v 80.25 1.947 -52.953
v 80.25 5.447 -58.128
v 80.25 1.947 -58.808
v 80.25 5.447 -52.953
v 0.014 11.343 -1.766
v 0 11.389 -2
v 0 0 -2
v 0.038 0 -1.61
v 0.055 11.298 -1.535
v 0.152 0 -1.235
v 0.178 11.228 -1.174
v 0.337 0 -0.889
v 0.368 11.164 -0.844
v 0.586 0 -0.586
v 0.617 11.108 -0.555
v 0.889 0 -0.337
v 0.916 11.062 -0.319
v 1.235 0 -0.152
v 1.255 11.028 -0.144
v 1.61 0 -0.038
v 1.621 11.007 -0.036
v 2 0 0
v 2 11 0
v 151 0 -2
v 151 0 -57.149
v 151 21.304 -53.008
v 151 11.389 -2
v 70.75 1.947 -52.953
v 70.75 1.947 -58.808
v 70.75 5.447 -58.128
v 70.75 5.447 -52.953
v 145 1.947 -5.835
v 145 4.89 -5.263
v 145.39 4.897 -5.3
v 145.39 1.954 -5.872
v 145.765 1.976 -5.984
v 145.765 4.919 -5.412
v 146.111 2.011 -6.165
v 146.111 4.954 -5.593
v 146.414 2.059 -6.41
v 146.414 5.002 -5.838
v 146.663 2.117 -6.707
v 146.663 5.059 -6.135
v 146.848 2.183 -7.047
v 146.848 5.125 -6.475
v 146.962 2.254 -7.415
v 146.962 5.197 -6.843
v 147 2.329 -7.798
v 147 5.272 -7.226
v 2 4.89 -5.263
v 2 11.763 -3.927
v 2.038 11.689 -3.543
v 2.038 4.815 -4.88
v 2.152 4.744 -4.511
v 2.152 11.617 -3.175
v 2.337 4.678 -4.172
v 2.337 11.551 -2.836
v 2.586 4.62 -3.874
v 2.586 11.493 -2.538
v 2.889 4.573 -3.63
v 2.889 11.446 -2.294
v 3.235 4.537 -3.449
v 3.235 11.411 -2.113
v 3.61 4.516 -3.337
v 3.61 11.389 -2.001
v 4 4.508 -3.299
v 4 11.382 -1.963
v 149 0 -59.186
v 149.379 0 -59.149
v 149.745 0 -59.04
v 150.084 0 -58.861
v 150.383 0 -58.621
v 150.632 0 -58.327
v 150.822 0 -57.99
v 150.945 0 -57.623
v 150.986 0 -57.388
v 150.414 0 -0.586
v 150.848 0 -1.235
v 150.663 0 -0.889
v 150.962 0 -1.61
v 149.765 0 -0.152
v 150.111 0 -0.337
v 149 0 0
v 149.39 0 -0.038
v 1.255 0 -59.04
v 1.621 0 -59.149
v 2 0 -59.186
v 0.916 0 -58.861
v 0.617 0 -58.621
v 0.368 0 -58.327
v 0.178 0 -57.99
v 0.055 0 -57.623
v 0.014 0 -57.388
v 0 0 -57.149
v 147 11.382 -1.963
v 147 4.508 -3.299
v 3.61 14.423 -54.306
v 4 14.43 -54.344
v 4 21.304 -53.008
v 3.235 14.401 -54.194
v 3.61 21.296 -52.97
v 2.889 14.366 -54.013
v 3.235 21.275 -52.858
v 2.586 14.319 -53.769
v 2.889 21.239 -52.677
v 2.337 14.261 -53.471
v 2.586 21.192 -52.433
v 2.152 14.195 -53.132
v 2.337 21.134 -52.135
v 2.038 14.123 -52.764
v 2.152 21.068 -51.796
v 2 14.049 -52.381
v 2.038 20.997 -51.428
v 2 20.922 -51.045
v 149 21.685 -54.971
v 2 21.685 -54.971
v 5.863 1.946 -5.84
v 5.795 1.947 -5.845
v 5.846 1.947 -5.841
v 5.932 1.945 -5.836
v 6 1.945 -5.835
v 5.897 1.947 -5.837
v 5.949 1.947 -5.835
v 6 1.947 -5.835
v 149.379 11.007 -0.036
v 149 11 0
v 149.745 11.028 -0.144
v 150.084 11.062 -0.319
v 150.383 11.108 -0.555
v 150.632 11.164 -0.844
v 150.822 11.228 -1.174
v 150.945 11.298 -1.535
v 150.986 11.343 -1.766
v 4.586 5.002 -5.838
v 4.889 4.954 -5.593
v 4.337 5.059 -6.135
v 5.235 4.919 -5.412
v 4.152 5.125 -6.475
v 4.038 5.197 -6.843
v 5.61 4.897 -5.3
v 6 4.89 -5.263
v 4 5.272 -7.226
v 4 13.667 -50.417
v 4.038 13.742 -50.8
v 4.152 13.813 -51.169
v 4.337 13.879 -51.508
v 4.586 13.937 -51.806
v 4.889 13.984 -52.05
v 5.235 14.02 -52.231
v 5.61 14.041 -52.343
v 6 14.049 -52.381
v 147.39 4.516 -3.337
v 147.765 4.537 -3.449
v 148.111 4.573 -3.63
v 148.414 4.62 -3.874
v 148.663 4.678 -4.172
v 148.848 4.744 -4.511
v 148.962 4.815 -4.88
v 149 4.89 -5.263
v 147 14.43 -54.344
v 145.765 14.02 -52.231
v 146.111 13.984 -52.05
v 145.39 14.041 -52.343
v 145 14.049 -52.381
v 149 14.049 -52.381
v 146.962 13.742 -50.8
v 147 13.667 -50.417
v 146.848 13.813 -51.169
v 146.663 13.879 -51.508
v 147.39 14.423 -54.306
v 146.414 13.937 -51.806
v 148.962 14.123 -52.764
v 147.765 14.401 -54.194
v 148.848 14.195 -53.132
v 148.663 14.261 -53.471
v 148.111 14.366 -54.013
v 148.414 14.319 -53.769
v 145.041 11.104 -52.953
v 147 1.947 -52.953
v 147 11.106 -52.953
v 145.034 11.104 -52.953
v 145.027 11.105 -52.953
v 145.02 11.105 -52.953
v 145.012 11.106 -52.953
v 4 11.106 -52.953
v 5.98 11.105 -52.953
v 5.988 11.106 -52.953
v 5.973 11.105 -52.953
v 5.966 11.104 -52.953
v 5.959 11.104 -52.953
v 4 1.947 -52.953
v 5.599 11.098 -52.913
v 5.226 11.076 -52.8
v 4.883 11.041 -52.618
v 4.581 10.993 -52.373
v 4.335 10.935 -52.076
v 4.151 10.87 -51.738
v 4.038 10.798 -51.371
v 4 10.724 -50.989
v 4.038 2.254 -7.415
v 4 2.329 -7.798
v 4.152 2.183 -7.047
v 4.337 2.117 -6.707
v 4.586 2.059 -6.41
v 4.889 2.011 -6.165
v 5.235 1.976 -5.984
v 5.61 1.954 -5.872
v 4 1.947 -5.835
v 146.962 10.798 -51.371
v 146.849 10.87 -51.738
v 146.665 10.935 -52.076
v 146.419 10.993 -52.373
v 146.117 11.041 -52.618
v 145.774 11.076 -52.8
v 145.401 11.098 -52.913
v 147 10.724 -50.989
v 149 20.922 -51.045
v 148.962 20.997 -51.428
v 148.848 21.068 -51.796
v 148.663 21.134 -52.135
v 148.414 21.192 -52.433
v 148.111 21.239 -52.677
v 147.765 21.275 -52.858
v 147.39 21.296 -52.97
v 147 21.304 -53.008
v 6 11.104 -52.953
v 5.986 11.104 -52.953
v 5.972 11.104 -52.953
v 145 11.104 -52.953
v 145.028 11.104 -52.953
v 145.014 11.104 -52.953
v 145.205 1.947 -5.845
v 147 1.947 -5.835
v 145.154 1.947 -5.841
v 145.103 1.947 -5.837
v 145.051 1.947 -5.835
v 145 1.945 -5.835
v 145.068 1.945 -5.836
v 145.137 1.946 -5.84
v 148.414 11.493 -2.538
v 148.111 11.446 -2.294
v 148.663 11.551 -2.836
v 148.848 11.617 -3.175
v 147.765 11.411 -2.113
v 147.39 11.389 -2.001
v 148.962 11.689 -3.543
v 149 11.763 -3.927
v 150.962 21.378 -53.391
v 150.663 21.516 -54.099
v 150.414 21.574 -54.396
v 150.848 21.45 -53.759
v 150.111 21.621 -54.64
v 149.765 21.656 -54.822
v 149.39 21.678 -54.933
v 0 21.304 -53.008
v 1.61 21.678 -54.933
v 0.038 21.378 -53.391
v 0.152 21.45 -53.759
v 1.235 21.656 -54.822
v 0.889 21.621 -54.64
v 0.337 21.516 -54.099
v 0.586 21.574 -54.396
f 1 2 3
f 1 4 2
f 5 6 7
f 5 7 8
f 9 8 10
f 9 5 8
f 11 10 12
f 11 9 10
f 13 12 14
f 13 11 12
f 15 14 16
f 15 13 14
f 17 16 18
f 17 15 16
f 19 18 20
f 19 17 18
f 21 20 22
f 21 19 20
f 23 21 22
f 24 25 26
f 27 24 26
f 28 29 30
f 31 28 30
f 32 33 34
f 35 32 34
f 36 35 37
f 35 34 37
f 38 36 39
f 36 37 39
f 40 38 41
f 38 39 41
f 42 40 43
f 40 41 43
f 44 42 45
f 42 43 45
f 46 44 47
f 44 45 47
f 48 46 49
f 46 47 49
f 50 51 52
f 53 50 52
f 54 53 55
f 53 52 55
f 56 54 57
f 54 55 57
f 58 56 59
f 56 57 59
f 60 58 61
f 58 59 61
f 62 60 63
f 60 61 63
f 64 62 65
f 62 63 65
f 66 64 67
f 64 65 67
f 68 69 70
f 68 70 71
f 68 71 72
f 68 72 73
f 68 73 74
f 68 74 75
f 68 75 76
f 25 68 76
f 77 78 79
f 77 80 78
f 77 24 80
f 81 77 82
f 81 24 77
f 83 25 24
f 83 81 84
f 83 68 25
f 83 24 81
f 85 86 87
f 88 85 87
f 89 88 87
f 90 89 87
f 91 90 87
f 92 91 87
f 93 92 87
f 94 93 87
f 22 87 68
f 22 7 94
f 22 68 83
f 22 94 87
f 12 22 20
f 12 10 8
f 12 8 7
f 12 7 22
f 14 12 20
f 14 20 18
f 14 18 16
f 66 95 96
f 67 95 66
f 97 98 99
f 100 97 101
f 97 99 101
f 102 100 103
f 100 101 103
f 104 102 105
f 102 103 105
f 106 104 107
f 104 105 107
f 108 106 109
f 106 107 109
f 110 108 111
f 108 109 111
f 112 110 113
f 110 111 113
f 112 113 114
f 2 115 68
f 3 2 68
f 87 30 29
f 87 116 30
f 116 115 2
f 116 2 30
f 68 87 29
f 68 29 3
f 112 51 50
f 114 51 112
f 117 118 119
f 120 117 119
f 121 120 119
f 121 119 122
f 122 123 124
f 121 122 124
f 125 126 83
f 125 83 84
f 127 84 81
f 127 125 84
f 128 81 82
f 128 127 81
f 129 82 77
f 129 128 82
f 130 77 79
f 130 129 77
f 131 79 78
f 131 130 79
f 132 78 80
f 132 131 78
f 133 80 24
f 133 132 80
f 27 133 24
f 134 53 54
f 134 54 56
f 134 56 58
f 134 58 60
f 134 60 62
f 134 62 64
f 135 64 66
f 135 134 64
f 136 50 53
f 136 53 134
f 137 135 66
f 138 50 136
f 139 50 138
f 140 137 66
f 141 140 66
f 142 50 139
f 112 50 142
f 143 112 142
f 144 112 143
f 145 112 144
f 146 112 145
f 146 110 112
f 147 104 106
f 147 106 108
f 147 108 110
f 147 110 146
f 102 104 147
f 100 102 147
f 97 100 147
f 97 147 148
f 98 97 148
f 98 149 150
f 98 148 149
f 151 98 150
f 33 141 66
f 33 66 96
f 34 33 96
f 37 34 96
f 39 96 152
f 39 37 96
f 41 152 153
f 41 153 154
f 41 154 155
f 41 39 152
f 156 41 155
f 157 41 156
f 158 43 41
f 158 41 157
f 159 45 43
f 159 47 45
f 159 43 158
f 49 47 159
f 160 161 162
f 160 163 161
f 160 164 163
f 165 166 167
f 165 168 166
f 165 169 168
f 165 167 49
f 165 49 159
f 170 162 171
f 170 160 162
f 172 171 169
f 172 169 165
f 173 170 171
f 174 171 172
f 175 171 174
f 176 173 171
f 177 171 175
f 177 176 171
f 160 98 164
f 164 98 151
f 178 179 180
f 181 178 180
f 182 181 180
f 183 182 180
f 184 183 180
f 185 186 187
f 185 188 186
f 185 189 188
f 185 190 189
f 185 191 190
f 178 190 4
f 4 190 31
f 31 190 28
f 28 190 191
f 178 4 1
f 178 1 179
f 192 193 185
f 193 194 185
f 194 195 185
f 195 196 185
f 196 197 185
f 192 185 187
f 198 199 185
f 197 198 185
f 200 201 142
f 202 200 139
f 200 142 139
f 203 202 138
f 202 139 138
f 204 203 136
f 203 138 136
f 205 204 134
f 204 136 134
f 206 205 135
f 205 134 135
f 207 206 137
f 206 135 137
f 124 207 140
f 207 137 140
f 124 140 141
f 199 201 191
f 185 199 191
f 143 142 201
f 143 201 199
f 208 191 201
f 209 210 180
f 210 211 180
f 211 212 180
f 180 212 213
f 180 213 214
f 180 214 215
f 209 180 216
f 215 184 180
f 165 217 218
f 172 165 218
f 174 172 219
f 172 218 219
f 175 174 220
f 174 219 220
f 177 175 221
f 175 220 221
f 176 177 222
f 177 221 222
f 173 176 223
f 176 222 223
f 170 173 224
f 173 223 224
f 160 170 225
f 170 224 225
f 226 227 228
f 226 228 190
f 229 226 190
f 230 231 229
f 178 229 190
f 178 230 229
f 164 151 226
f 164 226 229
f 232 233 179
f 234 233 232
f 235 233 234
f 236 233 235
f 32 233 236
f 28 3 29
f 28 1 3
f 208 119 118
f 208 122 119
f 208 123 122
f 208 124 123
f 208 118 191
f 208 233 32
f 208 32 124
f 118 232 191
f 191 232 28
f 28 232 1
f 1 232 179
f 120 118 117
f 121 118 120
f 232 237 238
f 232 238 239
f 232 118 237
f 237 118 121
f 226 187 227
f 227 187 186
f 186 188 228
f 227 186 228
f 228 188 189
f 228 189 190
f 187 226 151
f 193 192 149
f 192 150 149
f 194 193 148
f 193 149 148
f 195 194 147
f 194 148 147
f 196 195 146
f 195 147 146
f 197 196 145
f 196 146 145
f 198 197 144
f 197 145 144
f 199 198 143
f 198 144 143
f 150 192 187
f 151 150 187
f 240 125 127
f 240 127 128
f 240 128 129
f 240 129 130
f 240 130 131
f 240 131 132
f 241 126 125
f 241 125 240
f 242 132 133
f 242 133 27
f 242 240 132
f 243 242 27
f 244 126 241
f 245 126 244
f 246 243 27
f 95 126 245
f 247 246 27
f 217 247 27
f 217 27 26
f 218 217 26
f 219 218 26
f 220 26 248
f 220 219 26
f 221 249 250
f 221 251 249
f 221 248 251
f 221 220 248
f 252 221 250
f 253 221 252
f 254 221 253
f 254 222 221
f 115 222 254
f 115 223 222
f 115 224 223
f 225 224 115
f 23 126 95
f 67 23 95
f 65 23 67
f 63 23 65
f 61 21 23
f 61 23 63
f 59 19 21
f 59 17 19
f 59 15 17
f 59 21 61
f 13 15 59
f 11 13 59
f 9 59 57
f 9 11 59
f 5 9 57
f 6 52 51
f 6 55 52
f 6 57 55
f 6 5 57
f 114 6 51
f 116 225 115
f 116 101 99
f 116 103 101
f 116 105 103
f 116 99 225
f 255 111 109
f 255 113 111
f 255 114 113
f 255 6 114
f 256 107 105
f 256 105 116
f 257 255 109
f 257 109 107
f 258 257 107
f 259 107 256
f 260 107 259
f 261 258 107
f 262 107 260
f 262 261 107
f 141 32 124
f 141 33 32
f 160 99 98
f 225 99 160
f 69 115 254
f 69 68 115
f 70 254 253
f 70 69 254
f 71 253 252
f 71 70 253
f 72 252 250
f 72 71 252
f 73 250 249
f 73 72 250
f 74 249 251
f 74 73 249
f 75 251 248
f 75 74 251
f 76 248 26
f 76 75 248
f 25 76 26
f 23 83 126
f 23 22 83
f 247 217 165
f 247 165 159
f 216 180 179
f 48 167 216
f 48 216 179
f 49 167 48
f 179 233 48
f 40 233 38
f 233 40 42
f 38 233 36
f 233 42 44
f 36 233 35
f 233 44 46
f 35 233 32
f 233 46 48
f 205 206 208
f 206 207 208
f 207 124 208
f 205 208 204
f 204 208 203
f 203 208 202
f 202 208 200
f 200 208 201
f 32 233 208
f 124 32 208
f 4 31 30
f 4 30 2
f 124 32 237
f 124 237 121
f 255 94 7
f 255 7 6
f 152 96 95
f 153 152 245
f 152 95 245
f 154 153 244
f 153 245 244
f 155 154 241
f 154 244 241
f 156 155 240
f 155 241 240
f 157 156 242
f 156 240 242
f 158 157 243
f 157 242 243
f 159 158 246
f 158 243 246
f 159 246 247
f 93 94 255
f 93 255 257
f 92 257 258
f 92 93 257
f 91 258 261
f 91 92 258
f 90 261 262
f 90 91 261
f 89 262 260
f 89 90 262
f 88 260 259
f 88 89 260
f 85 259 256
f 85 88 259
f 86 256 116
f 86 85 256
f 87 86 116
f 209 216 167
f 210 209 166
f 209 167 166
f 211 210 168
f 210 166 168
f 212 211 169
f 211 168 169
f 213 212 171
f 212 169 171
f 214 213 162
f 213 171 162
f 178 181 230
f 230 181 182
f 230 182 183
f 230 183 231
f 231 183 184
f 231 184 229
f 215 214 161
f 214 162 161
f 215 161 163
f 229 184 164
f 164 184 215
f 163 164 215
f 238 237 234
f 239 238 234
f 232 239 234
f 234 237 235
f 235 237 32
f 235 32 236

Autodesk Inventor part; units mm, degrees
ref_plane "YZ Plane" through (0, 0, 0) normal (1, 0, 0) x (0, 1, 0)
ref_plane "XZ Plane" through (0, 0, 0) normal (0, 1, 0) x (-1, 0, 0)
sketch "Sketch1" plane through (0, 0, 0) normal (1, 0, 0) x (0, 1, 0)
  line L0 (0, 0) -> (11, 0)
  line L1 (11, 0) -> (21.6853, -54.9711)
  line L2 (11, 0) -> (67, 0) construction
  line L3 (21.6853, -54.9711) -> (0, -59.1863)
  line L4 (21.6853, -54.9711) -> (43.7765, -54.9711) construction
  line L5 (0, -59.1863) -> (0, 0)
  dimension "d0" = 11
  dimension "d1" = 56
  dimension "d2" = 79
  dimension "d5" = 169
extrude "Extrusion1" add sketch "Sketch1" along normal blind 151
fillet "Fillet1" radius 2 4 edges at (151, 10.8427, -57.0787) (151, 5.5, 0) (0, 10.8427, -57.0787) (0, 5.5, 0)
sketch "Sketch2" plane through (2, 11, 0) normal (0, 0.9816, 0.1908) x (1, 0, 0)
  ellipse E0 centre (0, 2.0374) end of major axis (0, 0) minor radius 2 (-2, 2.0374) -> (0, 0) ccw projected
  line L0 (0, 0) -> (147, 0) projected
  ellipse E1 centre (147, 2.0374) end of major axis (147, 0) minor radius 2 (147, 0) -> (149, 2.0374) ccw projected
  line L1 (149, 54) -> (149, 2.0374) projected
  arc A0 (149, 54) -> (147, 56) centre (147, 54) ccw projected
  line L2 (0, 56) -> (147, 56) projected
  arc A1 (0, 56) -> (-2, 54) centre (0, 54) ccw projected
  line L3 (-2, 54) -> (-2, 2.0374) projected
  line L4 (2, 54) -> (145, 54)
  line L5 (147, 52) -> (147, 4)
  line L6 (145, 2) -> (2, 2)
  line L7 (0, 4) -> (0, 52)
  arc A2 (2, 54) -> (0, 52) centre (2, 52) ccw
  arc A3 (0, 4) -> (2, 2) centre (2, 4) ccw
  arc A4 (145, 2) -> (147, 4) centre (145, 4) ccw
  arc A5 (147, 52) -> (145, 54) centre (145, 52) ccw
  point P0 (-2, -2.0989)
  dimension "d7" = 2
  dimension "d8" = 2
  dimension "d9" = 2
  dimension "d10" = 2
  dimension "d11" = 2
extrude "Extrusion2" cut sketch "Sketch2" against normal blind 7 contours L4 A5 L5 A4 L6 A3 L7 A2
sketch "Sketch3" plane through (2, 4.1286, -1.3357) normal (0, 0.9816, 0.1908) x (1, 0, 0)
  line L0 (4, 52) -> (143, 52)
  line L1 (145, 50) -> (145, 6)
  line L2 (143, 4) -> (4, 4)
  line L3 (2, 6) -> (2, 50)
  line L4 (2, 54) -> (145, 54) projected
  line L5 (147, 52) -> (147, 4) projected
  line L6 (145, 2) -> (2, 2) projected
  line L7 (0, 4) -> (0, 52) projected
  arc A0 (4, 52) -> (2, 50) centre (4, 50) ccw
  arc A1 (2, 6) -> (4, 4) centre (4, 6) ccw
  arc A2 (143, 4) -> (145, 6) centre (143, 6) ccw
  arc A3 (145, 50) -> (143, 52) centre (143, 50) ccw
  point P0 (-2, -2.0989)
  dimension "d14" = 2
  dimension "d15" = 2
  dimension "d16" = 2
  dimension "d17" = 2
  dimension "d18" = 2
extrude "Extrusion3" cut sketch "Sketch3" against normal blind 3
ref_plane "Work Plane1" through (75.5, 0, 0) normal (1, 0, 0) x (0, 0, -1)
sketch "Sketch4" plane through (75.5, 0, 0) normal (1, 0, 0) x (0, 0, -1)
  line L0 (5.2622, 4.8918) -> (5.8346, 1.947) projected
  line L1 (50.9894, 10.7242) -> (7.7979, 2.3286) projected
  line L2 (52.3803, 14.0507) -> (52.9527, 11.1058) projected
  line L3 (5.8346, 1.947) -> (52.9527, 11.1058)
  line L4 (5.8346, 1.947) -> (7.7979, 2.3286) projected
  line L5 (5.8346, 1.947) -> (52.9527, 1.947)
  line L6 (52.9527, 1.947) -> (52.9527, 11.1058)
  line L7 (5.8346, 1.947) -> (52.9527, 11.1058)
  point P0 (0, 0)
  point P1 (7.7979, 2.3286)
extrude "Extrusion4" cut sketch "Sketch4" along normal mid plane 143
sketch "Sketch5" plane through (4, 1.947, -52.9527) normal (0, 0, 1) x (1, 0, 0)
  line L0 (0, 9.1588) -> (2, 9.1588) projected
  line L1 (0, 9.1588) -> (0, 0) projected
  line L2 (143, 0) -> (0, 0) projected
  line L3 (143, 0) -> (143, 9.1588) projected
  line L4 (141, 9.1588) -> (143, 9.1588) projected
  line L5 (2, 9.1588) -> (141, 9.1588) projected
  line L6 (66.75, 3.5) -> (76.25, 3.5)
  line L7 (76.25, 3.5) -> (76.25, 0)
  line L8 (76.25, 0) -> (66.75, 0)
  line L9 (66.75, 0) -> (66.75, 3.5)
  point P0 (-4, -1.947)
  point P1 (0, 4.5794)
  point P2 (71.5, 3.5)
  point P3 (76.25, 0)
  dimension "d24" = 9.5
  dimension "d25" = 3.5
  dimension "d26" = 0
  dimension "d27" = 71.5
  dimension "d28" = 71.5
extrude "Extrusion5" cut sketch "Sketch5" against normal blind 10 contours L9 L6 L7 L2
properties part number "housing"
